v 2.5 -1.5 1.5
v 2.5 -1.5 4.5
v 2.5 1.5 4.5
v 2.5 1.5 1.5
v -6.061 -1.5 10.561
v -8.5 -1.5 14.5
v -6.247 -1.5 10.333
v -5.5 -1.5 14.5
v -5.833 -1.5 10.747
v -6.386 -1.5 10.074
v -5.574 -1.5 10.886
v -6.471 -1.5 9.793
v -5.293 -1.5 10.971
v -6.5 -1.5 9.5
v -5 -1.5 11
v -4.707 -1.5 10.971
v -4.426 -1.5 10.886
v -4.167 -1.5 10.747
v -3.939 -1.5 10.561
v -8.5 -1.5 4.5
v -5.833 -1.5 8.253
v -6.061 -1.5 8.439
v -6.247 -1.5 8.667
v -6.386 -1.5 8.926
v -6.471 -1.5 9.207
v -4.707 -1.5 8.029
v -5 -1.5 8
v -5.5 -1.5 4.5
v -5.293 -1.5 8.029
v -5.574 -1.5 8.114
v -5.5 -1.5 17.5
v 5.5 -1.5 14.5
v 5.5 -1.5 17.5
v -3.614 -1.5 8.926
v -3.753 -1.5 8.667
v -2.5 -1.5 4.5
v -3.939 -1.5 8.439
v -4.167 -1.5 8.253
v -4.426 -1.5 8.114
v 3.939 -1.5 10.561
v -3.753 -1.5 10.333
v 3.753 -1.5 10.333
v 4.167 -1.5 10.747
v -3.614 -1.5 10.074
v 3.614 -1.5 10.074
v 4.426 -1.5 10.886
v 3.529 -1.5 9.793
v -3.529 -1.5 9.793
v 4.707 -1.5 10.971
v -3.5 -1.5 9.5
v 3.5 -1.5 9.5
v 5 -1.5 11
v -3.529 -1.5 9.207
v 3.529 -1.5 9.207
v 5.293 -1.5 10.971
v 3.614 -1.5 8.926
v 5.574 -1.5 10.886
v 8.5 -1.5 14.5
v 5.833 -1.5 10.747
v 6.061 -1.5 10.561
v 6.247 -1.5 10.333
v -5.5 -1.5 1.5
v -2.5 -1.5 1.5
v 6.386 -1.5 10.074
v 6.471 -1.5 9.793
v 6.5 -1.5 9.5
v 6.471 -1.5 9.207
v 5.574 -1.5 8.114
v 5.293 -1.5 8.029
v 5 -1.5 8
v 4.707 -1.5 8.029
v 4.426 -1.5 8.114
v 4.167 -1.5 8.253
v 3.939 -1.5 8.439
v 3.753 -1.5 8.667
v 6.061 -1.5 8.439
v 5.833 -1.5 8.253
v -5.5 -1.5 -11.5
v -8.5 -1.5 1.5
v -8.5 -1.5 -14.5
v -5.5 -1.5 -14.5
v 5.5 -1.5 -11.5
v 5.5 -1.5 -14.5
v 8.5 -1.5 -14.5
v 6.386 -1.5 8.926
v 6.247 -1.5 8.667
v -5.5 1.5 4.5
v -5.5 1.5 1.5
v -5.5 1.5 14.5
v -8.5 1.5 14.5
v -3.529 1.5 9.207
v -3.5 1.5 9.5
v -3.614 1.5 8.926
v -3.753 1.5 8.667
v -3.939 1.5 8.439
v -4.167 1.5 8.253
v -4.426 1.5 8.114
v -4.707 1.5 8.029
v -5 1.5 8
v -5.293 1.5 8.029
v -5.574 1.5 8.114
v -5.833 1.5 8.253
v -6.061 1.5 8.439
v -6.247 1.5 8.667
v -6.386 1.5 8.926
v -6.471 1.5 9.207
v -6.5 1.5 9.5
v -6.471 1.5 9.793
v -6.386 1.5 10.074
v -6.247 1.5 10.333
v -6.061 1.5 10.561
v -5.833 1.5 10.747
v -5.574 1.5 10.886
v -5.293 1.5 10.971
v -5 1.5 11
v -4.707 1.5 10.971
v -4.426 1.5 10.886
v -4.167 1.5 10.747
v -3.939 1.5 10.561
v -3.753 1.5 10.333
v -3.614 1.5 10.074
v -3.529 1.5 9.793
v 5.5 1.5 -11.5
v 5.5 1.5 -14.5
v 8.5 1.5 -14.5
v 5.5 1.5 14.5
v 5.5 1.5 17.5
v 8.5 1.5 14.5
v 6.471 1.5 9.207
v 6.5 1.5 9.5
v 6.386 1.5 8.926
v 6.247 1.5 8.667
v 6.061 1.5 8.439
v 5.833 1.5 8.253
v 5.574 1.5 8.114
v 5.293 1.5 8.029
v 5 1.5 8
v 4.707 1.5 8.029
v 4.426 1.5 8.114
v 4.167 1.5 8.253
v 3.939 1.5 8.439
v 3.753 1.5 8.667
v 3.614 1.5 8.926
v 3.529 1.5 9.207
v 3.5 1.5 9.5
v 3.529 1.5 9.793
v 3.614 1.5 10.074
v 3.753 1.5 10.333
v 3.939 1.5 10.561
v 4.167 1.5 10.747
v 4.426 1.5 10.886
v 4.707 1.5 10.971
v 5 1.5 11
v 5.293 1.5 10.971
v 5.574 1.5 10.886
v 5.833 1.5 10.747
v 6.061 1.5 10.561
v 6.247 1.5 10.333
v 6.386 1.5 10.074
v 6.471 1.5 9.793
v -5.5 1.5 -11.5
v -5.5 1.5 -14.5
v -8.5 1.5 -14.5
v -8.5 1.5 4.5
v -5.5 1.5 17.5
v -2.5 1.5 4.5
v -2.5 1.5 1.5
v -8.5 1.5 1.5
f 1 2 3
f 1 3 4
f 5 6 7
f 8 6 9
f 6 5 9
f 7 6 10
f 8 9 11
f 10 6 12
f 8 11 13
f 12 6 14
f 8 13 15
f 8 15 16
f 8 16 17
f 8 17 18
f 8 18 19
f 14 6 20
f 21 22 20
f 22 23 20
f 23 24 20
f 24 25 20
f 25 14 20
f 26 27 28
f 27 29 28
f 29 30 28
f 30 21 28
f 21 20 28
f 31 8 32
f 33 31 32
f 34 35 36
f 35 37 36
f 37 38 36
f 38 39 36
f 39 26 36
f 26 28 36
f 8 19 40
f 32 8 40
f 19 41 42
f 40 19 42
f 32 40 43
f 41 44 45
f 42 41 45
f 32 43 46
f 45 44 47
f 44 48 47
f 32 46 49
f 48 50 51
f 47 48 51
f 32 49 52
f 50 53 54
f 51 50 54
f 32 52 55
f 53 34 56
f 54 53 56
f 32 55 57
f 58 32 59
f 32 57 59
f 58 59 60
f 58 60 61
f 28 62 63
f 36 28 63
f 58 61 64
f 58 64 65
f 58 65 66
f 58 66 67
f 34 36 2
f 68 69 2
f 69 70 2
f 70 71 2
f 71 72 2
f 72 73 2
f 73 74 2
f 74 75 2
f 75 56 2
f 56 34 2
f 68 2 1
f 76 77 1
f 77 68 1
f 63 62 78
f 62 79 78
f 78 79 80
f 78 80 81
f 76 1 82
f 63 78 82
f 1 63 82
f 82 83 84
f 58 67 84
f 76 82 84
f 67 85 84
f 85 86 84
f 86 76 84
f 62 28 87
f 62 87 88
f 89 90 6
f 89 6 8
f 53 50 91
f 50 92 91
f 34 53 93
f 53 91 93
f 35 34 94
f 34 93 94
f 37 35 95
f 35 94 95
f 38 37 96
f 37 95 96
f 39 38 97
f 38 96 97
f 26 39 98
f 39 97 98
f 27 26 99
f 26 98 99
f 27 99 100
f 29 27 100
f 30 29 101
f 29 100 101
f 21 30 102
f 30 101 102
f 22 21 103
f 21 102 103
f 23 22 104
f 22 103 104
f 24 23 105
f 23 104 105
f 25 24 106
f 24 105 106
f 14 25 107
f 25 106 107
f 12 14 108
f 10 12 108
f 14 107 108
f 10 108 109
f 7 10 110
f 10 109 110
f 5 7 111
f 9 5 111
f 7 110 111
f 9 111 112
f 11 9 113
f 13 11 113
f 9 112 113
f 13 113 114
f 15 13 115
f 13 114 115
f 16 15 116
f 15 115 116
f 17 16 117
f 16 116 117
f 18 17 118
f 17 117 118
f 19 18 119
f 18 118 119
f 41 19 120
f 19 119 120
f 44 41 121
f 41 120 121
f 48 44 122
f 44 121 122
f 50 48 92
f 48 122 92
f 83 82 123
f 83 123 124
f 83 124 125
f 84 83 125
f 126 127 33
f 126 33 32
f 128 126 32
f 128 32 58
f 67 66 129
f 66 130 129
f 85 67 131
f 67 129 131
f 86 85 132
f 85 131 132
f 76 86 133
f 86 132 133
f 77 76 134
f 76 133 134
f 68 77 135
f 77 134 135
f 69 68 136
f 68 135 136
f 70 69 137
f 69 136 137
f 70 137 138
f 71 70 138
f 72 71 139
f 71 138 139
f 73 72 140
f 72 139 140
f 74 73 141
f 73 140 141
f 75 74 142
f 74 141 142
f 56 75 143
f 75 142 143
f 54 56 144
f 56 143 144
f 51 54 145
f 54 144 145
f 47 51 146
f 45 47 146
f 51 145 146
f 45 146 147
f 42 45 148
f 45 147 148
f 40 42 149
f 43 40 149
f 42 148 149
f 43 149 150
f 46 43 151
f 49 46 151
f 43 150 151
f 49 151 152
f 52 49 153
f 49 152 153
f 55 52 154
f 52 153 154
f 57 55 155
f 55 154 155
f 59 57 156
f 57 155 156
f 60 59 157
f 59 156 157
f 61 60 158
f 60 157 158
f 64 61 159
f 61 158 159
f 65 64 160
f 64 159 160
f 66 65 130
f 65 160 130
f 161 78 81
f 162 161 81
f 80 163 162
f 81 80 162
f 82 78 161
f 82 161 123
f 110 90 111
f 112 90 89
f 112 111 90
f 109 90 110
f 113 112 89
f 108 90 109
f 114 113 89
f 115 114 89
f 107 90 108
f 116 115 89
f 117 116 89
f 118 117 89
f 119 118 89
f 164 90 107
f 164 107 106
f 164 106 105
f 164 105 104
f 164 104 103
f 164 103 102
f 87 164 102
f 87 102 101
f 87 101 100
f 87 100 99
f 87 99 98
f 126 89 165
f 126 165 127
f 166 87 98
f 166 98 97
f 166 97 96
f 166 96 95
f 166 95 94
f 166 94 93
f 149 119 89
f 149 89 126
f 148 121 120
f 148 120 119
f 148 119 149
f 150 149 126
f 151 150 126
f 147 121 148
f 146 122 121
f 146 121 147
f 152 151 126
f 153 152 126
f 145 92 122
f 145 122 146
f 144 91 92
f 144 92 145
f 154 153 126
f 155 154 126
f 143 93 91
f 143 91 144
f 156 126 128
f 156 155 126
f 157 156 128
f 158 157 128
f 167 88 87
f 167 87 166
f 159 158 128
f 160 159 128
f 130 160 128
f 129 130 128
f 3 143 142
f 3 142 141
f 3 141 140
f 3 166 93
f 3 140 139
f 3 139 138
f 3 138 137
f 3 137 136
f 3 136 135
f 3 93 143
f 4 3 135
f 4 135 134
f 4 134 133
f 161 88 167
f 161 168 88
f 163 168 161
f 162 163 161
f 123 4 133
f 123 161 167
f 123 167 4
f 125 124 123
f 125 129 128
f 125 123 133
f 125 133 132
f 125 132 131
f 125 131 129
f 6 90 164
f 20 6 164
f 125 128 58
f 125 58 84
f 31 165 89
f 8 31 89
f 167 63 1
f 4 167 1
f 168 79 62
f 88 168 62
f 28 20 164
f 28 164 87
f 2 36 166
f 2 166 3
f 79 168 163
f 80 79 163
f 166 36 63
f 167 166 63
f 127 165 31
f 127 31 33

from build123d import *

# Parameters (mm, degrees)
SKETCH1_W               = 17
SKETCH1_H               = 29
BOSS_EXTRUDE1_DEPTH     = 1.5
SKETCH2_W               = 11
SKETCH2_H               = 3
BOSS_EXTRUDE2_DEPTH     = 1.5
SKETCH3_W               = 5
SKETCH3_H               = 3
SKETCH3_W_2             = 11
SKETCH3_W_3             = 3
CUT_EXTRUDE1_DEPTH      = 2.5
CUT_EXTRUDE1_DEPTH_BACK = 2.5
SKETCH5_R               = 1.5
CUT_EXTRUDE3_DEPTH      = 2.5
CUT_EXTRUDE3_DEPTH_BACK = 2.5


with BuildPart() as part:
    # Sketch1 → Boss-Extrude1 (new body, symmetric)
    with BuildSketch(Plane(origin=(0, 0, 0), x_dir=(1, 0, 0), z_dir=(0, 1, 0))):
        Rectangle(SKETCH1_W, SKETCH1_H)
    extrude(amount=BOSS_EXTRUDE1_DEPTH, both=True)

    # Sketch2 → Boss-Extrude2 (add, symmetric)
    with BuildSketch(Plane(origin=(0, 0, 0), x_dir=(1, 0, 0), z_dir=(0, 1, 0))):
        with Locations((0, -16)):
            Rectangle(SKETCH2_W, SKETCH2_H)
    extrude(amount=BOSS_EXTRUDE2_DEPTH, both=True)

    # Sketch3 → Cut-Extrude1 (cut, two sides)
    with BuildSketch(Plane(origin=(0, 0, 0), x_dir=(1, 0, 0), z_dir=(0, 1, 0))) as cut_extrude1_sk:
        with Locations((0, -3)):
            Rectangle(SKETCH3_W, SKETCH3_H)
        with Locations((0, 13)):
            Rectangle(SKETCH3_W_2, SKETCH3_H)
        with Locations((-7, -3)):
            Rectangle(SKETCH3_W_3, SKETCH3_H)
    extrude(amount=CUT_EXTRUDE1_DEPTH, mode=Mode.SUBTRACT)
    extrude(cut_extrude1_sk.sketch, amount=-CUT_EXTRUDE1_DEPTH_BACK, mode=Mode.SUBTRACT)

    # Sketch5 → Cut-Extrude3 (cut, two sides)
    with BuildSketch(Plane(origin=(0, 0, 0), x_dir=(1, 0, 0), z_dir=(0, 1, 0))) as cut_extrude3_sk:
        with Locations((-5, -9.5)):
            Circle(SKETCH5_R)
        with Locations((5, -9.5)):
            Circle(SKETCH5_R)
    extrude(amount=CUT_EXTRUDE3_DEPTH, mode=Mode.SUBTRACT)
    extrude(cut_extrude3_sk.sketch, amount=-CUT_EXTRUDE3_DEPTH_BACK, mode=Mode.SUBTRACT)


solid = part.part
